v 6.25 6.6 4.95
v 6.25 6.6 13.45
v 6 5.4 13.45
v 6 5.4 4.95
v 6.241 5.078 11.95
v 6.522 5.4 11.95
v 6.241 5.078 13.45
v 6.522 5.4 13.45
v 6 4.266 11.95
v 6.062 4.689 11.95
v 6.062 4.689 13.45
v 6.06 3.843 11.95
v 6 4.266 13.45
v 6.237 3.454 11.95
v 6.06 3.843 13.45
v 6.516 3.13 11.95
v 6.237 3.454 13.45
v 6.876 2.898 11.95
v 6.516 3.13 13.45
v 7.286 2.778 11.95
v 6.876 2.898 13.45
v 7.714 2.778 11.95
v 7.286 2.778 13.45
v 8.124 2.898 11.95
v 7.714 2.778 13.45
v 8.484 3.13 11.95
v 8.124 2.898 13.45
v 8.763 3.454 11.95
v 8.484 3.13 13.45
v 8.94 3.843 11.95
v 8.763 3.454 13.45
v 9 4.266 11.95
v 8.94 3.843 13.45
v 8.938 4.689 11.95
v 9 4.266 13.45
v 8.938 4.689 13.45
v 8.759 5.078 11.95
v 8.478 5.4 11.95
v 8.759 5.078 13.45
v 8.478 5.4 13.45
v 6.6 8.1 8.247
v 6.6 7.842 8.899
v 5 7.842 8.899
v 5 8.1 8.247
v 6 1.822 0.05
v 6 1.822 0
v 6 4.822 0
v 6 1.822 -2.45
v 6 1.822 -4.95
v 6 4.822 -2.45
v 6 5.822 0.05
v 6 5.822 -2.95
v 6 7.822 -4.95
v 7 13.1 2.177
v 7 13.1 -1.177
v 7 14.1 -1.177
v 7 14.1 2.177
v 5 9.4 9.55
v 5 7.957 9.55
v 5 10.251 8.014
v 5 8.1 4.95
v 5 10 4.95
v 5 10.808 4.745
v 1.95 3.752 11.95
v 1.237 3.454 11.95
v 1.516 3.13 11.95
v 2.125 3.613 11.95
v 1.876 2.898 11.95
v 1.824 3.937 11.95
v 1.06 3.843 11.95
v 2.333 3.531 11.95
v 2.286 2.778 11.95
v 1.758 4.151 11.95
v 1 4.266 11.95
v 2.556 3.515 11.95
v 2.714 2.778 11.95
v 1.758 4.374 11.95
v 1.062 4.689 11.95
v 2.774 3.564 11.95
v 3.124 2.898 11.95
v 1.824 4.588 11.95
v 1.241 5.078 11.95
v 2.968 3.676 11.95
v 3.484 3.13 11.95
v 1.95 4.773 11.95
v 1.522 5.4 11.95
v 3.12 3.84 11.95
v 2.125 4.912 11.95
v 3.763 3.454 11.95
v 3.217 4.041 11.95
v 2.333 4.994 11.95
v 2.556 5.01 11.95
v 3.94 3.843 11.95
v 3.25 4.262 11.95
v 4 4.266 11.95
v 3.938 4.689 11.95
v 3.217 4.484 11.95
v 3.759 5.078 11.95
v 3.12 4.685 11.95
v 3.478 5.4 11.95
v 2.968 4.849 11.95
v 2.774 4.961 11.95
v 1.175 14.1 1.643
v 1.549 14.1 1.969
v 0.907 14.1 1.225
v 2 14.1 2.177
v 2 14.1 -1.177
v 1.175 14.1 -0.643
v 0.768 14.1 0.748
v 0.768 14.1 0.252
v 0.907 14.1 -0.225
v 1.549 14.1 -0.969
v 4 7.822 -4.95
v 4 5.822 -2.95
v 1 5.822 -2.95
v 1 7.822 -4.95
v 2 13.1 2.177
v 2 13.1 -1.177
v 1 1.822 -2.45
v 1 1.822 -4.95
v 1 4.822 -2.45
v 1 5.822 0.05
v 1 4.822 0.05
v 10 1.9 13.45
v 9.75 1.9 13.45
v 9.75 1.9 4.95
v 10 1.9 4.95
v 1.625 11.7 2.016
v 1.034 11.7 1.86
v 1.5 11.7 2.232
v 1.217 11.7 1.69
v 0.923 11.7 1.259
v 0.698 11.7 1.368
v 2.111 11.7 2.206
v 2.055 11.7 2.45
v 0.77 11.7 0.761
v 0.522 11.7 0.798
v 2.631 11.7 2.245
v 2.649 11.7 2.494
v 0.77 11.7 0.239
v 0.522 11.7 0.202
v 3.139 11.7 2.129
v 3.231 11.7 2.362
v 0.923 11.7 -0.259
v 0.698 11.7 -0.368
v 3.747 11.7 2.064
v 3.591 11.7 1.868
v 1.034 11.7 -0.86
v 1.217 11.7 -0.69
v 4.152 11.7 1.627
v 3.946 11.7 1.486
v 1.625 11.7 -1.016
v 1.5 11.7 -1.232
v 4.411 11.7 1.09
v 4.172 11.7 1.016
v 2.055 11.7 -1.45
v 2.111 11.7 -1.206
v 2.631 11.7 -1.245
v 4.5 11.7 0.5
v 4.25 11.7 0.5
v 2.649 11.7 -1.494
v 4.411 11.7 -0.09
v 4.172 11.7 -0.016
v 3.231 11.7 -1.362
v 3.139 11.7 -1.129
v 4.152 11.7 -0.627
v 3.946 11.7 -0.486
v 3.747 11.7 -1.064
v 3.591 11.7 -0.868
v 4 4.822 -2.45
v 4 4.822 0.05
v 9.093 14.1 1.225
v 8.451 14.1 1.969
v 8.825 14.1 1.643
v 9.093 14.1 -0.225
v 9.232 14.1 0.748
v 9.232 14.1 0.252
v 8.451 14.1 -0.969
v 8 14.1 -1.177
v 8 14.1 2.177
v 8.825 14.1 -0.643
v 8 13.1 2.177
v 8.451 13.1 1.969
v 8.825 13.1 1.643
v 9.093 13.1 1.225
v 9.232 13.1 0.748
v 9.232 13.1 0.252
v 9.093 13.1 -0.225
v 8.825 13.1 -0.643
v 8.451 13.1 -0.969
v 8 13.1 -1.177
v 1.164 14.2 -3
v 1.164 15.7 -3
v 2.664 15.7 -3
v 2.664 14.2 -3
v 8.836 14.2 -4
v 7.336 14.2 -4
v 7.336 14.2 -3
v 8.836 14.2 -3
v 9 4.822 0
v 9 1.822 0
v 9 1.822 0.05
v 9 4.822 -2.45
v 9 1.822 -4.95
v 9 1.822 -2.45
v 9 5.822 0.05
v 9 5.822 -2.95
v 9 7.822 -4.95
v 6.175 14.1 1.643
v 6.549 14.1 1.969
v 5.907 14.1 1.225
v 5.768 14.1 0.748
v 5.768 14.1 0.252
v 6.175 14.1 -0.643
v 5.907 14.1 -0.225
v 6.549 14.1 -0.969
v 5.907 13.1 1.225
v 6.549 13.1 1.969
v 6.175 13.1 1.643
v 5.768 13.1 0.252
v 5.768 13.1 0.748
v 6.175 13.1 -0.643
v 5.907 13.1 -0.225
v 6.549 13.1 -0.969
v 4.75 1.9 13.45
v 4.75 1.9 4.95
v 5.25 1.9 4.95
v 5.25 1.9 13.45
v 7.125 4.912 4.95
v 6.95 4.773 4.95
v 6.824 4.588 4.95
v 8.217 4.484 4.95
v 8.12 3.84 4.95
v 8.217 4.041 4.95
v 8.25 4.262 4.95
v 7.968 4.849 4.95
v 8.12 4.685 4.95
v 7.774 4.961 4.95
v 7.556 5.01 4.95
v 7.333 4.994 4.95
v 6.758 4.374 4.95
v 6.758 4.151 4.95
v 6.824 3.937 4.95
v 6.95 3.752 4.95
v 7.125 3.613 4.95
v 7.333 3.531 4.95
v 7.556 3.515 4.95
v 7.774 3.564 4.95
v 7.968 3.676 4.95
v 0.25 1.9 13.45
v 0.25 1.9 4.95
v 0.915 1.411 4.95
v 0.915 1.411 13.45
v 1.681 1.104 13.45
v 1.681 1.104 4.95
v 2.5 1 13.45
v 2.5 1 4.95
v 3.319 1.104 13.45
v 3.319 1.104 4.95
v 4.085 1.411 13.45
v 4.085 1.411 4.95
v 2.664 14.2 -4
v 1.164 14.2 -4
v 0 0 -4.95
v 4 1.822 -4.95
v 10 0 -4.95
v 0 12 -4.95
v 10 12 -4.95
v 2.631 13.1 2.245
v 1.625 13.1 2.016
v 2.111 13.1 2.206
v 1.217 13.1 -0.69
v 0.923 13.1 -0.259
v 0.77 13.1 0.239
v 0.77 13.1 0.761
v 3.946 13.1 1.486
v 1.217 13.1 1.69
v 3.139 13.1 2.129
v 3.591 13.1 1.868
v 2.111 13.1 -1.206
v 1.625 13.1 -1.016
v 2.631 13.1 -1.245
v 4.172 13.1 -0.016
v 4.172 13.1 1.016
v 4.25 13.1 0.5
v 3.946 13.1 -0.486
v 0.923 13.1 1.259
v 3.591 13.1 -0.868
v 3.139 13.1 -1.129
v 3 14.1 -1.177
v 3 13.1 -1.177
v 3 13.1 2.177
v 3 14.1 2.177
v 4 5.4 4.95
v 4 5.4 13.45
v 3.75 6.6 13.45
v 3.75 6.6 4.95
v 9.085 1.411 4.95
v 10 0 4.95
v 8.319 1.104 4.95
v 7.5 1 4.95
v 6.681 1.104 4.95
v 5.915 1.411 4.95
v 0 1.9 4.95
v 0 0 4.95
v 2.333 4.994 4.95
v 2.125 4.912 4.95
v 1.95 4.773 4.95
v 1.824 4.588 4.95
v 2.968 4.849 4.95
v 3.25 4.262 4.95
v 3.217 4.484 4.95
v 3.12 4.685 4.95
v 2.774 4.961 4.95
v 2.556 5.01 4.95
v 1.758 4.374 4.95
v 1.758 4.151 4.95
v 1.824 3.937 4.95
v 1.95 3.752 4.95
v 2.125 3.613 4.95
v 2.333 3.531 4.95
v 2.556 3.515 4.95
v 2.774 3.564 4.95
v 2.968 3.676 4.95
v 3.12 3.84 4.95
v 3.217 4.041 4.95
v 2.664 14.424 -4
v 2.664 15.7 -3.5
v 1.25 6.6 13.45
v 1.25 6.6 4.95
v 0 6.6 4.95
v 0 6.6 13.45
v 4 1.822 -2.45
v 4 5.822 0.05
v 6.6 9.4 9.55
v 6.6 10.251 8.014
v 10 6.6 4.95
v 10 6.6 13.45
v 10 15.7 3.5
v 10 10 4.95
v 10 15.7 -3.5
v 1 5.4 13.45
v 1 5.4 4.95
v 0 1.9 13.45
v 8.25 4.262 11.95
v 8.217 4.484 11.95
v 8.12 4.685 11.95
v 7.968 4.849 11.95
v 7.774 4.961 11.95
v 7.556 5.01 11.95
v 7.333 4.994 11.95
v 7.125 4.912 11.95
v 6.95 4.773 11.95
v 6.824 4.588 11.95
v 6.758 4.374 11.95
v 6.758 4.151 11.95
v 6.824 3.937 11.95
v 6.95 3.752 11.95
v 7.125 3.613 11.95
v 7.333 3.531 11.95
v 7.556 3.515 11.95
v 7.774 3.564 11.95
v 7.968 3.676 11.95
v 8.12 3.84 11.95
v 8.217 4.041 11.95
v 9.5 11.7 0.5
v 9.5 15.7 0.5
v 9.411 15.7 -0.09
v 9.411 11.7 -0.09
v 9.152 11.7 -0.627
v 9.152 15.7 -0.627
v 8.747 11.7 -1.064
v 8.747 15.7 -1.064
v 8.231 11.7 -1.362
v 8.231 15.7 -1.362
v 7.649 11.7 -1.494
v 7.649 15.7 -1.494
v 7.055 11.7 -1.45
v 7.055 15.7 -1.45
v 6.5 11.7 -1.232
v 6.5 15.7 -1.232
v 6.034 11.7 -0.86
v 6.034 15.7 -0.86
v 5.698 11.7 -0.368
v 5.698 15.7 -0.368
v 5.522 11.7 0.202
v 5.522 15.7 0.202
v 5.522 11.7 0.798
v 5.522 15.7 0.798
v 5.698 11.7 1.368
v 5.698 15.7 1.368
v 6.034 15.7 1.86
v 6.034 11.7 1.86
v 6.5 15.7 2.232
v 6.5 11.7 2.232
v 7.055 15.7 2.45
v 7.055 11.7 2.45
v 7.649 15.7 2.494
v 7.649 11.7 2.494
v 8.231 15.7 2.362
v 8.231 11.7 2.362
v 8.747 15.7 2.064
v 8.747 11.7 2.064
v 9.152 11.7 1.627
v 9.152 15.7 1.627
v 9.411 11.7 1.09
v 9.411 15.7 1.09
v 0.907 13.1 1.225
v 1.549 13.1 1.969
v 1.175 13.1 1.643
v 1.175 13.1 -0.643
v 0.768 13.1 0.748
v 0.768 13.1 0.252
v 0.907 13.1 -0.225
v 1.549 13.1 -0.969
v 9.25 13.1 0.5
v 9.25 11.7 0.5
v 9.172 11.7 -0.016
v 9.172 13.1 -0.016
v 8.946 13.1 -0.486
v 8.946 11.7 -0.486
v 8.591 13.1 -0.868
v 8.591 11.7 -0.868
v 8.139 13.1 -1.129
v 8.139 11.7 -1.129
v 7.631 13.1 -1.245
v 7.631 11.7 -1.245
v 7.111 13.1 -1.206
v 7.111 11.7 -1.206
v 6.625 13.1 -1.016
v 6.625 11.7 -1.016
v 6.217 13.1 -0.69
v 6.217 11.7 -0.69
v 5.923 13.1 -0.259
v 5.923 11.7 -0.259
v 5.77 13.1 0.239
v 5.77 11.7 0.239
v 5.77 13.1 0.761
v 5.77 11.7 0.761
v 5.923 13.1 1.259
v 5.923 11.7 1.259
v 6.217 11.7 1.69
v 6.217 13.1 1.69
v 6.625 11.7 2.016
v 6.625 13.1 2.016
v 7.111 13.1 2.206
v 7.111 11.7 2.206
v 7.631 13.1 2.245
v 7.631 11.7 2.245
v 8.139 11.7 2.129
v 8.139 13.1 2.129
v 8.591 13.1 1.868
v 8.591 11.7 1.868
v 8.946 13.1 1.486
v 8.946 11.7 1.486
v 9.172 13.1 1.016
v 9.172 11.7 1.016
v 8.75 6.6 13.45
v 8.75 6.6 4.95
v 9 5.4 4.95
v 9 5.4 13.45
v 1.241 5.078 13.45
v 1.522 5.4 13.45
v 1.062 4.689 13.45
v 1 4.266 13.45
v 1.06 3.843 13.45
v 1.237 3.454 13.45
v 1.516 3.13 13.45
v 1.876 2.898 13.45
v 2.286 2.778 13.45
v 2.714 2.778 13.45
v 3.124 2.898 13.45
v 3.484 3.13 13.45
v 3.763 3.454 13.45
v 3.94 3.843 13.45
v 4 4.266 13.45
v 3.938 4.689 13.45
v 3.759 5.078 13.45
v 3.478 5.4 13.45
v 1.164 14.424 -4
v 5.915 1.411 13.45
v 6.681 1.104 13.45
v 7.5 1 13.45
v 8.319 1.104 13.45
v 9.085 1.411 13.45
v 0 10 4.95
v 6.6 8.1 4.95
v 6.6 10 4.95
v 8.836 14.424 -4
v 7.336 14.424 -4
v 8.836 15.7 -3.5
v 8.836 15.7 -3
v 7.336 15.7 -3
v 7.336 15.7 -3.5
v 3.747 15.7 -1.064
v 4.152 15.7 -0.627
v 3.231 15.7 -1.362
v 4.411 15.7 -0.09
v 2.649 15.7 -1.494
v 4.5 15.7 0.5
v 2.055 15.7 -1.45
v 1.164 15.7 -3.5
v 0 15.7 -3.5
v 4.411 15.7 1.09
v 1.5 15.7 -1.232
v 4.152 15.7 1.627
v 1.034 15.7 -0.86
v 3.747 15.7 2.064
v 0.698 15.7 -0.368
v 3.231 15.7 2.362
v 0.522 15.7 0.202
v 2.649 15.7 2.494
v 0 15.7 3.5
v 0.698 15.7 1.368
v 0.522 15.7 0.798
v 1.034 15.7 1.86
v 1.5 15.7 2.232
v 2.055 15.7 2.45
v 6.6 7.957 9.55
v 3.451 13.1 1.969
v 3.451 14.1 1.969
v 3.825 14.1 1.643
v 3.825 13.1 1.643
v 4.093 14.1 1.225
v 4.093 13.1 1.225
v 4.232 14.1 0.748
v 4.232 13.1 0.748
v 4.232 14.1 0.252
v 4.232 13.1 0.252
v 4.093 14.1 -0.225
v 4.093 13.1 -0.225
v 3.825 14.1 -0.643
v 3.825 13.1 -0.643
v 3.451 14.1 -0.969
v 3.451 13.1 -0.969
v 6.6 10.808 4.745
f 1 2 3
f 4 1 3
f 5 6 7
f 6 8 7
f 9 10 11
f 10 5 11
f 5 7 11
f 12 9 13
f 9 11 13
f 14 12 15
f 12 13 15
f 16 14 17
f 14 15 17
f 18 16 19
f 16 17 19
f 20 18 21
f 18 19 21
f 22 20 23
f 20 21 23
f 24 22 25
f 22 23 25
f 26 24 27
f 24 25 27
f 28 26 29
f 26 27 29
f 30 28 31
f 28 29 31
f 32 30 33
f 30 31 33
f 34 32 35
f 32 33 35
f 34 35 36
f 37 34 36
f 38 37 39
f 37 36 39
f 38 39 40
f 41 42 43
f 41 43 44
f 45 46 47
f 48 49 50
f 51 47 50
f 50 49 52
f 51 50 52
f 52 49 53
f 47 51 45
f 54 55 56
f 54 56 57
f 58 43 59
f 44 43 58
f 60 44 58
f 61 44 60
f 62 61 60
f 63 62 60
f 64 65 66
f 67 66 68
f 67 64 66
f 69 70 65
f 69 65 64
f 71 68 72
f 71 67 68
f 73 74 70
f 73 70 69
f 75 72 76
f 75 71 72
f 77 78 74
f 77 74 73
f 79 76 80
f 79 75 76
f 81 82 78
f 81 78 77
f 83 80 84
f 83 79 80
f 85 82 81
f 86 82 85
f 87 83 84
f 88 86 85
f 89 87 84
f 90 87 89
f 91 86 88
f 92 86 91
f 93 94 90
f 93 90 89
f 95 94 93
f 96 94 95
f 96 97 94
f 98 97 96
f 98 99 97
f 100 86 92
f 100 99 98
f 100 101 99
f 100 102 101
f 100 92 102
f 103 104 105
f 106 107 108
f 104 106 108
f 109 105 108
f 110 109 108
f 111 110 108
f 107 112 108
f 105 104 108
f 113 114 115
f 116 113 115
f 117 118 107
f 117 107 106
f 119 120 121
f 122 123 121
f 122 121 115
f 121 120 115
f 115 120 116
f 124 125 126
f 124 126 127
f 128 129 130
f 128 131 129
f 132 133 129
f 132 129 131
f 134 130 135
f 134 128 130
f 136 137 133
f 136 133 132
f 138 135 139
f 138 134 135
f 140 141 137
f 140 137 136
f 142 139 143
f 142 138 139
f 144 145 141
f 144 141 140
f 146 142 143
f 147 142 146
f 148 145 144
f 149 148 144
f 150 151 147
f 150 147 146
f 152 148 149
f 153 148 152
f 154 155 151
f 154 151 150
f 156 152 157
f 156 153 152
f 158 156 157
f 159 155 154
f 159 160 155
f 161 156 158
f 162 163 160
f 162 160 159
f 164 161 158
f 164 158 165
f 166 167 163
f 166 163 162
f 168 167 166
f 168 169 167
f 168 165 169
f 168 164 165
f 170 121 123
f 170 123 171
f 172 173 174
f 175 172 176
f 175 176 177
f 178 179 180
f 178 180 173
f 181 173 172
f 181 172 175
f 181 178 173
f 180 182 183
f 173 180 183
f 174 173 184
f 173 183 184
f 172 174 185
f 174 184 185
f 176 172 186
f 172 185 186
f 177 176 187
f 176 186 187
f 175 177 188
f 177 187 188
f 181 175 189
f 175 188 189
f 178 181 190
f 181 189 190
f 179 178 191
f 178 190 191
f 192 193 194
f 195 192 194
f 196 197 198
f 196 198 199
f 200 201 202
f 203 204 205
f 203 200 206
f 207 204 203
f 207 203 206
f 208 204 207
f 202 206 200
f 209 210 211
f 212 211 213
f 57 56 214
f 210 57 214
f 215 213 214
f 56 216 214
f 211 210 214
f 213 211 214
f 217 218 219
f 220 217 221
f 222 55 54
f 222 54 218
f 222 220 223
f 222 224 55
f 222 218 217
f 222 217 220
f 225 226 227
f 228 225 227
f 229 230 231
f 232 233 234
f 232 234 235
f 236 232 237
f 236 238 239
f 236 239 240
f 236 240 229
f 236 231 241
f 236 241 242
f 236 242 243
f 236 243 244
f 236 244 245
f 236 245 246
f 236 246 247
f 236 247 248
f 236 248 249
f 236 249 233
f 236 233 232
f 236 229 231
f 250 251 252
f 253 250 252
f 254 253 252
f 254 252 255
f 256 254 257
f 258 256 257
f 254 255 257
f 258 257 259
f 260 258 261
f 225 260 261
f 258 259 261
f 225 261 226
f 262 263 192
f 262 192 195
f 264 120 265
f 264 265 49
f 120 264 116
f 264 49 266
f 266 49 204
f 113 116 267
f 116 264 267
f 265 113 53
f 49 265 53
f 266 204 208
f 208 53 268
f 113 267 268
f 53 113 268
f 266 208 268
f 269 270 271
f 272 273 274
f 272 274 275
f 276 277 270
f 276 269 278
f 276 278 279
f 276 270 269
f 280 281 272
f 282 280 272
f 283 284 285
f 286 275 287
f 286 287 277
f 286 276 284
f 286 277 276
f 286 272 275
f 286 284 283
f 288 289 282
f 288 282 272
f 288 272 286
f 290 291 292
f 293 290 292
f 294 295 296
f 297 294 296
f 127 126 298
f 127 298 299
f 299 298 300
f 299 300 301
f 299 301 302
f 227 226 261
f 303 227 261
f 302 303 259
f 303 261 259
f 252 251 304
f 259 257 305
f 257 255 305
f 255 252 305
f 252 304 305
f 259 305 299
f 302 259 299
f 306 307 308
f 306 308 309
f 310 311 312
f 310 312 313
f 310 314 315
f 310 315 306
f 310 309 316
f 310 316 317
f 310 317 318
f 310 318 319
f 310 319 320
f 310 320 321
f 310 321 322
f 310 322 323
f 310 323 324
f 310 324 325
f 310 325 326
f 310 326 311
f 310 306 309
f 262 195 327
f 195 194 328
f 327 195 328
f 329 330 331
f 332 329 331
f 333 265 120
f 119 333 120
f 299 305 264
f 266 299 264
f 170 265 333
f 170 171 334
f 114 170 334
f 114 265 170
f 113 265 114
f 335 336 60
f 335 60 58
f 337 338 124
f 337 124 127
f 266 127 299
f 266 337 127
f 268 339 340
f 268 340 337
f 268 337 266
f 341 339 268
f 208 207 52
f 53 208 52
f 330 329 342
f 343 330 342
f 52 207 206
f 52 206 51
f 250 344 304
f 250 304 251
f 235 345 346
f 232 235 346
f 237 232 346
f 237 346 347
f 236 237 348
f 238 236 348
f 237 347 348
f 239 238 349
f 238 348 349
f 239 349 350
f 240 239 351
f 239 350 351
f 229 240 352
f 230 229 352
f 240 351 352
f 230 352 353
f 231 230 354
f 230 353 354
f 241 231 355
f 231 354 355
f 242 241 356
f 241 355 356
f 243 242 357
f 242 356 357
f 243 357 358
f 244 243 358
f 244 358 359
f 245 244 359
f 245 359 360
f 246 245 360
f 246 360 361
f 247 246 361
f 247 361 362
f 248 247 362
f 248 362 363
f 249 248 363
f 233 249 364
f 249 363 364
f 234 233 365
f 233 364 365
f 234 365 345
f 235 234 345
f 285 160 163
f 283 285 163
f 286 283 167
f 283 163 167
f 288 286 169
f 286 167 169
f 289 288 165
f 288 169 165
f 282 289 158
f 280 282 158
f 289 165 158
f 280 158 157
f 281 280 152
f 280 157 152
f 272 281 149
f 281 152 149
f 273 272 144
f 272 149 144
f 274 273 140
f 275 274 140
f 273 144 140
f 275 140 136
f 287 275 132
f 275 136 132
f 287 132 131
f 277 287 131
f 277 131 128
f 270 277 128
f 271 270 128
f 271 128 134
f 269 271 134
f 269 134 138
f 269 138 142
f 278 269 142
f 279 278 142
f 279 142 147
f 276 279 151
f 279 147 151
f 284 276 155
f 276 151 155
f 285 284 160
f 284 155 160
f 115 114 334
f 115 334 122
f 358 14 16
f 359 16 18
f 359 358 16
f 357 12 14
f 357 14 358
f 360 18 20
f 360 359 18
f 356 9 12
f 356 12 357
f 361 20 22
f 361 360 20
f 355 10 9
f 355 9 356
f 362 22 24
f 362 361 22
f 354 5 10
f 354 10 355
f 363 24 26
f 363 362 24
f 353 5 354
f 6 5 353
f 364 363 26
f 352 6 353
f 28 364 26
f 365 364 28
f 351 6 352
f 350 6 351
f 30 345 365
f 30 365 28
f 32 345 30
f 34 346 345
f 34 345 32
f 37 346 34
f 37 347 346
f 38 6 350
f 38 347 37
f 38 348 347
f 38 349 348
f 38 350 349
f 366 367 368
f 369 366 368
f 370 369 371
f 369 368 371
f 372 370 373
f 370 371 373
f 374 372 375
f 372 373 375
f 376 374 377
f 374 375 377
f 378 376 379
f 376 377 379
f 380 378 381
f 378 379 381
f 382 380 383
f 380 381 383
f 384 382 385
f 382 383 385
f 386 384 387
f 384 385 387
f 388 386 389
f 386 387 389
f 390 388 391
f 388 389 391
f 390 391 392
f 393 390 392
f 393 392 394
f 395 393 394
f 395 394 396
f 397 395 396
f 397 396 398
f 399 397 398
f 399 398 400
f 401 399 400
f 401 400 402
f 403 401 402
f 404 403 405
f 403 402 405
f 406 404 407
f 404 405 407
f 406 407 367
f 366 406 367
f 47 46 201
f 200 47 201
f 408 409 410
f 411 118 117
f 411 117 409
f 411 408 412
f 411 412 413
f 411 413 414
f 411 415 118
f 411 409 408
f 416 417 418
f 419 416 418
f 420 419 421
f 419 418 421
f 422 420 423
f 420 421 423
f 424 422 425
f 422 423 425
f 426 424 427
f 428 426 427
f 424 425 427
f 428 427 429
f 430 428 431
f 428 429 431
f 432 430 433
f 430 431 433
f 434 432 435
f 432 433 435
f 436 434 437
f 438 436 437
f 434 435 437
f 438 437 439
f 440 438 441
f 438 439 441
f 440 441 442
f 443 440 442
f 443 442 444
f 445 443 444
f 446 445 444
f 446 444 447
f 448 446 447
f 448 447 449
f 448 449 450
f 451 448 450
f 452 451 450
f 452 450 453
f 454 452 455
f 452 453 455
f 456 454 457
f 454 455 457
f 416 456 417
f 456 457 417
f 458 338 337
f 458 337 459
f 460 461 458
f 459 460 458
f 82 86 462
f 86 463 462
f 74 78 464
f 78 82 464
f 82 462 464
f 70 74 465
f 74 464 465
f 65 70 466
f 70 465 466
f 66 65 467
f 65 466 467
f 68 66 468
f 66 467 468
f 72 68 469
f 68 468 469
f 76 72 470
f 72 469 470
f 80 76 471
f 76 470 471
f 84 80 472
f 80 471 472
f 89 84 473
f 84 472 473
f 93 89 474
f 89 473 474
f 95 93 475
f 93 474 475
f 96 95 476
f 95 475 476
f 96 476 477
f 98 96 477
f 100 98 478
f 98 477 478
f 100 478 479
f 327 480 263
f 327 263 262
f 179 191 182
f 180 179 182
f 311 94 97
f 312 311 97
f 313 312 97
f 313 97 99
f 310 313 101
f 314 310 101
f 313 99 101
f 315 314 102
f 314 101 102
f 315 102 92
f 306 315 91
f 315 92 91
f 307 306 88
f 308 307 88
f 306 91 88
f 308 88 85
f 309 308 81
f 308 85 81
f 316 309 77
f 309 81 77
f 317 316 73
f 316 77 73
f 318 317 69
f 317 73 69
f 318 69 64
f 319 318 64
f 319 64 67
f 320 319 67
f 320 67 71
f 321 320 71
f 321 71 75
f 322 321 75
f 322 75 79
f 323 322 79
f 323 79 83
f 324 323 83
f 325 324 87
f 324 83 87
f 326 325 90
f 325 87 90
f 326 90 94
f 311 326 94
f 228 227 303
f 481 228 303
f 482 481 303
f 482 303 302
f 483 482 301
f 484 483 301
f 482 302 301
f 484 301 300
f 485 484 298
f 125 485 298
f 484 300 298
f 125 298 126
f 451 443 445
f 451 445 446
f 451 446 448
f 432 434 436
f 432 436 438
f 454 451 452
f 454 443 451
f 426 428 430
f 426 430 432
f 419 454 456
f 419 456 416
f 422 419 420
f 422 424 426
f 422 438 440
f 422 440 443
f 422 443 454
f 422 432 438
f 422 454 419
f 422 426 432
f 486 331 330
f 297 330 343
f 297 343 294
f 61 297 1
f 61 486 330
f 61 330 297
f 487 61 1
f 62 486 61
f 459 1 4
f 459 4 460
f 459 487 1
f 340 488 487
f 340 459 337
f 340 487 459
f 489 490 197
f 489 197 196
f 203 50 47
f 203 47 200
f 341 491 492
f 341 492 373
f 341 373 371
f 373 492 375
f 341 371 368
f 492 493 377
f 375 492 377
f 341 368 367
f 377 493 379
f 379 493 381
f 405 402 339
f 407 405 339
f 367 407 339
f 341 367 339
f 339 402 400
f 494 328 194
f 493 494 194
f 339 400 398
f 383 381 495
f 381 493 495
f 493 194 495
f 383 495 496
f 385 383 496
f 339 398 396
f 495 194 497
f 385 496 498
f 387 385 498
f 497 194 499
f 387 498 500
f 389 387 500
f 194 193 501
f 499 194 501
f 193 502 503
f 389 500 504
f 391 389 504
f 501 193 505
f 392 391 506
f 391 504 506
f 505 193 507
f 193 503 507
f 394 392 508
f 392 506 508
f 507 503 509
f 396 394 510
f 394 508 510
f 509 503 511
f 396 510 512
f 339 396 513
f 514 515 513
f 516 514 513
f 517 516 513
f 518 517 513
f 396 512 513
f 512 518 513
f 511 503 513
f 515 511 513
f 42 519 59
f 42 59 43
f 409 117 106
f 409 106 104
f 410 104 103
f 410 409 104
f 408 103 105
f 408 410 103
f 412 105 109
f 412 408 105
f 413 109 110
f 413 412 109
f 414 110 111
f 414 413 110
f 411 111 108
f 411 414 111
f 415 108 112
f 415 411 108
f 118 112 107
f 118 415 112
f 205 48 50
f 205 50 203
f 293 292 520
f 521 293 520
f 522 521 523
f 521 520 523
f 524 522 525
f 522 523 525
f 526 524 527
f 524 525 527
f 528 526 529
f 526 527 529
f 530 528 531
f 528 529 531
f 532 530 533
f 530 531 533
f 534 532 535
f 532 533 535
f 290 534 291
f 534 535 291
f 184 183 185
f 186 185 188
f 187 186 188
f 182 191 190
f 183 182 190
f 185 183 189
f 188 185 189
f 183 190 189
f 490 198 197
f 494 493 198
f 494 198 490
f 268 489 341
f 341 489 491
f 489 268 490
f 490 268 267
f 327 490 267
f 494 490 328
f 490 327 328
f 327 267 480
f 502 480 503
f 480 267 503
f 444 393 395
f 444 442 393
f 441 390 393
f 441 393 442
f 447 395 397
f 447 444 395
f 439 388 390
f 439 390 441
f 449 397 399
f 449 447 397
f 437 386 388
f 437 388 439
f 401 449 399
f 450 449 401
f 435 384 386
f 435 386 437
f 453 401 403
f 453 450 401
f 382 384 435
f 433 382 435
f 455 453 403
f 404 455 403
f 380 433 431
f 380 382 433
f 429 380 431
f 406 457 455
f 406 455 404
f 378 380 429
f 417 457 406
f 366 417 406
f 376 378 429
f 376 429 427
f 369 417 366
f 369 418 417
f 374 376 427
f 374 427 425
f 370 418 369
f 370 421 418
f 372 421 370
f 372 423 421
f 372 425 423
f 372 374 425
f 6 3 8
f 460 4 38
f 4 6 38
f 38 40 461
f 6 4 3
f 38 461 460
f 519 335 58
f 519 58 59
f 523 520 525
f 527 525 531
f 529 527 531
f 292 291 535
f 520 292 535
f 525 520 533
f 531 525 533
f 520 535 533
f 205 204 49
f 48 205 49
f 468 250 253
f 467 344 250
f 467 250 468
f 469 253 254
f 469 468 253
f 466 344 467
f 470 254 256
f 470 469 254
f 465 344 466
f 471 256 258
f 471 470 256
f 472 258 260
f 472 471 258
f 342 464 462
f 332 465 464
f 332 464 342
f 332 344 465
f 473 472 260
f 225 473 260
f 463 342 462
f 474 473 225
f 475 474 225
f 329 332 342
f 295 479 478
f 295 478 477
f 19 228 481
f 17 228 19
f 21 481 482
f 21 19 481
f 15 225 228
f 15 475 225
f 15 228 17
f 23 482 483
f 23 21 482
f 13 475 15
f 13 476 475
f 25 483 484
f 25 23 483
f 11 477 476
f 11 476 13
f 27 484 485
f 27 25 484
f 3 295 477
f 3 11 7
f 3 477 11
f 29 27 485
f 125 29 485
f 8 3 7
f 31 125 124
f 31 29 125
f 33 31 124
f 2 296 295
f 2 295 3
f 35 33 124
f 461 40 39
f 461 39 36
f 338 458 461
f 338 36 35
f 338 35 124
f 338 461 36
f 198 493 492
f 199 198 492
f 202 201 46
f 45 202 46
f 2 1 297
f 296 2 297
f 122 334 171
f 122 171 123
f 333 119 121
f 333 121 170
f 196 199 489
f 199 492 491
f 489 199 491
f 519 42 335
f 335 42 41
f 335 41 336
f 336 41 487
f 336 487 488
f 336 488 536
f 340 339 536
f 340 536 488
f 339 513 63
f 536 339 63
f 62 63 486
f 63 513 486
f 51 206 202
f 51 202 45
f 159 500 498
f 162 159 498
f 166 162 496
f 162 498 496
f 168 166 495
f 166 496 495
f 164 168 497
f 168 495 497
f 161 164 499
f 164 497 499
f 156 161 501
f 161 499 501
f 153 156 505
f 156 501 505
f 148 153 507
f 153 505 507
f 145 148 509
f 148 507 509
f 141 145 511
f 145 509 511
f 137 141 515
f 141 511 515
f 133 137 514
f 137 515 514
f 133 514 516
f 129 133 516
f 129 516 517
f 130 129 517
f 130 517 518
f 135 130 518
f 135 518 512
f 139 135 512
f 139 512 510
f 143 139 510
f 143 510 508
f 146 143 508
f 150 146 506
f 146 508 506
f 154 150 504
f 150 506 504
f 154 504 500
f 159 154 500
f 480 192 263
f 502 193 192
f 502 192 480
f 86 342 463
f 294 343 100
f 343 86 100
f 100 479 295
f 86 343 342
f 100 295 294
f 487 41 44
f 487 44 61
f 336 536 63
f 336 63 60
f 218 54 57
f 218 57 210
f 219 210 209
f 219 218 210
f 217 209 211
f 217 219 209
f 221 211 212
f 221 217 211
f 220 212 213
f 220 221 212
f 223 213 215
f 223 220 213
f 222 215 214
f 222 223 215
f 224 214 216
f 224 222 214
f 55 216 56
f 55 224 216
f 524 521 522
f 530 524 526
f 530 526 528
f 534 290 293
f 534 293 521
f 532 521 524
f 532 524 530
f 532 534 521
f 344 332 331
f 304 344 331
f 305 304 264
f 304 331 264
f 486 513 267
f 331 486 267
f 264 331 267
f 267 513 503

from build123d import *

# Parameters (mm, degrees)
AUFSATZ_LINEAR_AUSTRAGEN1_DEPTH             = 10
AUFSATZ_LINEAR_START                        = -9.9
AUFSATZ_LINEAR_AUSTRAGEN2_DEPTH             = 18.4
SCHNITT_LINEAR_AUSTRAGEN1_DEPTH             = 8.5
SKIZZE4_R                                   = 1.5
SCHNITT_LINEAR_AUSTRAGEN2_DEPTH             = 1.5
AUFSATZ_LINEAR_AUSTRAGEN4_DEPTH             = 10
SCHNITT_LINEAR_AUSTRAGEN3_REACH             = 11.9
SKIZZE6_W                                   = 5
SKIZZE6_H                                   = 8.452104708
SKIZZE6_W_2                                 = 3.4
SCHNITT_LINEAR_AUSTRAGEN3_DIRECTION_2_DEPTH = 9.5
SKIZZE7_W                                   = 1.5
SKIZZE7_H                                   = 1
SCHNITT_LINEAR_AUSTRAGEN4_DEPTH             = 1.5
SKIZZE8_R                                   = 2
SCHNITT_LINEAR_AUSTRAGEN5_DEPTH             = 4
SKIZZE9_W                                   = 3
SKIZZE9_H                                   = 4
SCHNITT_LINEAR_AUSTRAGEN6_DEPTH             = 5
SKIZZE10_R                                  = 0.75
SCHNITT_LINEAR_AUSTRAGEN7_DEPTH             = 7
FASE1_SIZE                                  = 2
SKIZZE11_W                                  = 3
SKIZZE11_H                                  = 2.45
SKIZZE11_H_2                                = 2.5
AUFSATZ_LINEAR_AUSTRAGEN5_DEPTH             = 3
SKIZZE12_R                                  = 1.75
AUFSATZ_LINEAR_AUSTRAGEN6_DEPTH             = 1.4
AUFSATZ_LINEAR_AUSTRAGEN7_DEPTH             = 1
AUFSATZ_LINEAR_AUSTRAGEN7_2_DEPTH           = 1
AUFSATZ_LINEAR_AUSTRAGEN7_3_DEPTH           = 1
AUFSATZ_LINEAR_AUSTRAGEN7_4_DEPTH           = 1


with BuildPart() as part:
    # Skizze1 → Aufsatz-Linear austragen1 (new body)
    with BuildSketch(Plane(origin=(0, 0, 0), x_dir=(0, 0, -1), z_dir=(1, 0, 0))):
        Polygon((3.5, 15.7), (-3.5, 15.7), (-4.95, 10), (-4.95, 0), (4.95, 0), (4.95, 12), align=None)
    extrude(amount=AUFSATZ_LINEAR_AUSTRAGEN1_DEPTH)

    # Skizze2 → Aufsatz-Linear austragen2 (add)
    with BuildSketch(Plane.XY.offset(4.95).offset(AUFSATZ_LINEAR_START)):
        with BuildLine():
            Line((4.75, 1.9), (5.25, 1.9))
            ThreePointArc((5.25, 1.9), (7.5, 1), (9.75, 1.9))
            Line((9.75, 1.9), (10, 1.9))
            Line((10, 1.9), (10, 6.6))
            Line((10, 6.6), (0, 6.6))
            Line((0, 6.6), (0, 1.9))
            Line((0, 1.9), (0.25, 1.9))
            ThreePointArc((0.25, 1.9), (2.5, 1), (4.75, 1.9))
        make_face()
    extrude(amount=AUFSATZ_LINEAR_AUSTRAGEN2_DEPTH)

    # Skizze3 → Schnitt-Linear austragen1 (cut)
    with BuildSketch(Plane.XY.offset(13.45)):
        Polygon((1.25, 6.6), (1, 5.4), (4, 5.4), (3.75, 6.6), align=None)
        Polygon((6.25, 6.6), (6, 5.4), (9, 5.4), (8.75, 6.6), align=None)
    extrude(amount=-SCHNITT_LINEAR_AUSTRAGEN1_DEPTH, mode=Mode.SUBTRACT)

    # Skizze4 → Schnitt-Linear austragen2 (cut)
    with BuildSketch(Plane.XY.offset(13.45)):
        with Locations((2.5, 4.2625)):
            Circle(SKIZZE4_R)
        with Locations((7.5, 4.2625)):
            Circle(SKIZZE4_R)
    extrude(amount=-SCHNITT_LINEAR_AUSTRAGEN2_DEPTH, mode=Mode.SUBTRACT)

    # Skizze5 → Aufsatz-Linear austragen4 (add, through all)
    with BuildSketch(Plane(origin=(10, 0, 0), x_dir=(0, 0, -1), z_dir=(1, 0, 0))):
        Polygon((-4.744529464, 10.807711762), (-8.014071378, 10.251051744), (-9.55, 9.4), (-9.55, 7.956699146), (-8.898693464, 7.842399632), (-8.247386929, 8.1), (-4.95, 8.1), (-4.95, 10), align=None)
    extrude(amount=-AUFSATZ_LINEAR_AUSTRAGEN4_DEPTH)

    # Schnitt-Linear austragen3: up to this face of the body (flat: up to its plane)
    schnitt_linear_austragen3_end = Plane(part.part.faces().sort_by_distance((5, 13.253855881, 4.122264732))[0])
    # Skizze6 → Schnitt-Linear austragen3 (cut, up to the picked face)
    with BuildSketch(Plane.XY.offset(4.95), mode=Mode.PRIVATE) as schnitt_linear_austragen3_sk1:
        with Locations((2.5, 11.473947646)):
            Rectangle(SKIZZE6_W, SKIZZE6_H)
    schnitt_linear_austragen3_tool1 = split(extrude(schnitt_linear_austragen3_sk1.sketch, amount=-SCHNITT_LINEAR_AUSTRAGEN3_REACH, mode=Mode.PRIVATE), bisect_by=schnitt_linear_austragen3_end, keep=Keep.BOTH, mode=Mode.PRIVATE)
    add(schnitt_linear_austragen3_tool1.solids().sort_by_distance((2.5, 11.473948, 4.95))[0], mode=Mode.SUBTRACT)
    # Skizze6 → Schnitt-Linear austragen3 (cut, up to the picked face)
    with BuildSketch(Plane.XY.offset(4.95), mode=Mode.PRIVATE) as schnitt_linear_austragen3_sk2:
        with Locations((8.3, 11.473947646)):
            Rectangle(SKIZZE6_W_2, SKIZZE6_H)
    schnitt_linear_austragen3_tool2 = split(extrude(schnitt_linear_austragen3_sk2.sketch, amount=-SCHNITT_LINEAR_AUSTRAGEN3_REACH, mode=Mode.PRIVATE), bisect_by=schnitt_linear_austragen3_end, keep=Keep.BOTH, mode=Mode.PRIVATE)
    add(schnitt_linear_austragen3_tool2.solids().sort_by_distance((8.3, 11.473948, 4.95))[0], mode=Mode.SUBTRACT)

    # Skizze6 → Schnitt-Linear austragen3 direction 2 (cut)
    with BuildSketch(Plane.XY.offset(4.95)):
        with Locations((2.5, 11.473947646)):
            Rectangle(SKIZZE6_W, SKIZZE6_H)
        with Locations((8.3, 11.473947646)):
            Rectangle(SKIZZE6_W_2, SKIZZE6_H)
    extrude(amount=SCHNITT_LINEAR_AUSTRAGEN3_DIRECTION_2_DEPTH, mode=Mode.SUBTRACT)

    # Skizze7 → Schnitt-Linear austragen4 (cut)
    with BuildSketch(Plane(origin=(0, 15.7, 0), x_dir=(1, 0, 0), z_dir=(0, 1, 0))):
        with Locations((1.913600435, 3.5)):
            Rectangle(SKIZZE7_W, SKIZZE7_H)
        with Locations((8.086399565, 3.5)):
            Rectangle(SKIZZE7_W, SKIZZE7_H)
    extrude(amount=-SCHNITT_LINEAR_AUSTRAGEN4_DEPTH, mode=Mode.SUBTRACT)

    # Skizze8 → Schnitt-Linear austragen5 (cut)
    with BuildSketch(Plane(origin=(0, 15.7, 0), x_dir=(1, 0, 0), z_dir=(0, 1, 0))):
        with Locations((2.5, -0.5)):
            Circle(SKIZZE8_R)
        with Locations((7.5, -0.5)):
            Circle(SKIZZE8_R)
    extrude(amount=-SCHNITT_LINEAR_AUSTRAGEN5_DEPTH, mode=Mode.SUBTRACT)

    # Skizze9 → Schnitt-Linear austragen6 (cut)
    with BuildSketch(Plane(origin=(0, 0, -4.95), x_dir=(-1, 0, 0), z_dir=(0, 0, -1))):
        with Locations((-7.5, 3.821692415)):
            Rectangle(SKIZZE9_W, SKIZZE9_H)
        with Locations((-2.5, 3.821692415)):
            Rectangle(SKIZZE9_W, SKIZZE9_H)
    extrude(amount=-SCHNITT_LINEAR_AUSTRAGEN6_DEPTH, mode=Mode.SUBTRACT)

    # Skizze10 → Schnitt-Linear austragen7 (cut)
    with BuildSketch(Plane.XY.offset(11.95)):
        with Locations((2.5, 4.2625)):
            Circle(SKIZZE10_R)
        with Locations((7.5, 4.2625)):
            Circle(SKIZZE10_R)
    extrude(amount=-SCHNITT_LINEAR_AUSTRAGEN7_DEPTH, mode=Mode.SUBTRACT)

    # Fase1
    fase1_edges = [part.edges().sort_by_distance(p)[0] for p in [
        (7.5, 5.821692415, -4.95),
        (2.5, 5.821692415, -4.95),
    ]]
    chamfer(fase1_edges, length=FASE1_SIZE)

    # Skizze11 → Aufsatz-Linear austragen5 (add)
    with BuildSketch(Plane(origin=(0, 1.821692415, 0), x_dir=(1, 0, 0), z_dir=(0, 1, 0))):
        with Locations((7.5, 1.225)):
            Rectangle(SKIZZE11_W, SKIZZE11_H)
        with Locations((2.5, 1.2)):
            Rectangle(SKIZZE11_W, SKIZZE11_H_2)
    extrude(amount=AUFSATZ_LINEAR_AUSTRAGEN5_DEPTH)

    # Skizze12 → Aufsatz-Linear austragen6 (add)
    with BuildSketch(Plane(origin=(0, 11.7, 0), x_dir=(1, 0, 0), z_dir=(0, 1, 0))):
        with Locations((7.5, -0.5)):
            Circle(SKIZZE12_R)
        with Locations((2.5, -0.5)):
            Circle(SKIZZE12_R)
    extrude(amount=AUFSATZ_LINEAR_AUSTRAGEN6_DEPTH)


with BuildPart() as body_2:
    # Skizze13 → Aufsatz-Linear austragen7 (new body)
    with BuildSketch(Plane(origin=(0, 13.1, 0), x_dir=(1, 0, 0), z_dir=(0, 1, 0))):
        with BuildLine():
            Line((2, 1.177050983), (2, -2.177050983))
            ThreePointArc((2, -2.177050983), (0.75, -0.5), (2, 1.177050983))
        make_face()
    extrude(amount=AUFSATZ_LINEAR_AUSTRAGEN7_DEPTH)


with BuildPart() as body_3:
    # Skizze13 → Aufsatz-Linear austragen7 2 (new body)
    with BuildSketch(Plane(origin=(0, 13.1, 0), x_dir=(1, 0, 0), z_dir=(0, 1, 0))):
        with BuildLine():
            Line((3, 1.177050983), (3, -2.177050983))
            ThreePointArc((3, -2.177050983), (4.25, -0.5), (3, 1.177050983))
        make_face()
    extrude(amount=AUFSATZ_LINEAR_AUSTRAGEN7_2_DEPTH)


with BuildPart() as body_4:
    # Skizze13 → Aufsatz-Linear austragen7 3 (new body)
    with BuildSketch(Plane(origin=(0, 13.1, 0), x_dir=(1, 0, 0), z_dir=(0, 1, 0))):
        with BuildLine():
            Line((7, 1.177050983), (7, -2.177050983))
            ThreePointArc((7, -2.177050983), (5.75, -0.5), (7, 1.177050983))
        make_face()
    extrude(amount=AUFSATZ_LINEAR_AUSTRAGEN7_3_DEPTH)


with BuildPart() as body_5:
    # Skizze13 → Aufsatz-Linear austragen7 4 (new body)
    with BuildSketch(Plane(origin=(0, 13.1, 0), x_dir=(1, 0, 0), z_dir=(0, 1, 0))):
        with BuildLine():
            Line((8, 1.177050983), (8, -2.177050983))
            ThreePointArc((8, -2.177050983), (9.25, -0.5), (8, 1.177050983))
        make_face()
    extrude(amount=AUFSATZ_LINEAR_AUSTRAGEN7_4_DEPTH)


solid = Compound([part.part, body_2.part, body_3.part, body_4.part, body_5.part])
